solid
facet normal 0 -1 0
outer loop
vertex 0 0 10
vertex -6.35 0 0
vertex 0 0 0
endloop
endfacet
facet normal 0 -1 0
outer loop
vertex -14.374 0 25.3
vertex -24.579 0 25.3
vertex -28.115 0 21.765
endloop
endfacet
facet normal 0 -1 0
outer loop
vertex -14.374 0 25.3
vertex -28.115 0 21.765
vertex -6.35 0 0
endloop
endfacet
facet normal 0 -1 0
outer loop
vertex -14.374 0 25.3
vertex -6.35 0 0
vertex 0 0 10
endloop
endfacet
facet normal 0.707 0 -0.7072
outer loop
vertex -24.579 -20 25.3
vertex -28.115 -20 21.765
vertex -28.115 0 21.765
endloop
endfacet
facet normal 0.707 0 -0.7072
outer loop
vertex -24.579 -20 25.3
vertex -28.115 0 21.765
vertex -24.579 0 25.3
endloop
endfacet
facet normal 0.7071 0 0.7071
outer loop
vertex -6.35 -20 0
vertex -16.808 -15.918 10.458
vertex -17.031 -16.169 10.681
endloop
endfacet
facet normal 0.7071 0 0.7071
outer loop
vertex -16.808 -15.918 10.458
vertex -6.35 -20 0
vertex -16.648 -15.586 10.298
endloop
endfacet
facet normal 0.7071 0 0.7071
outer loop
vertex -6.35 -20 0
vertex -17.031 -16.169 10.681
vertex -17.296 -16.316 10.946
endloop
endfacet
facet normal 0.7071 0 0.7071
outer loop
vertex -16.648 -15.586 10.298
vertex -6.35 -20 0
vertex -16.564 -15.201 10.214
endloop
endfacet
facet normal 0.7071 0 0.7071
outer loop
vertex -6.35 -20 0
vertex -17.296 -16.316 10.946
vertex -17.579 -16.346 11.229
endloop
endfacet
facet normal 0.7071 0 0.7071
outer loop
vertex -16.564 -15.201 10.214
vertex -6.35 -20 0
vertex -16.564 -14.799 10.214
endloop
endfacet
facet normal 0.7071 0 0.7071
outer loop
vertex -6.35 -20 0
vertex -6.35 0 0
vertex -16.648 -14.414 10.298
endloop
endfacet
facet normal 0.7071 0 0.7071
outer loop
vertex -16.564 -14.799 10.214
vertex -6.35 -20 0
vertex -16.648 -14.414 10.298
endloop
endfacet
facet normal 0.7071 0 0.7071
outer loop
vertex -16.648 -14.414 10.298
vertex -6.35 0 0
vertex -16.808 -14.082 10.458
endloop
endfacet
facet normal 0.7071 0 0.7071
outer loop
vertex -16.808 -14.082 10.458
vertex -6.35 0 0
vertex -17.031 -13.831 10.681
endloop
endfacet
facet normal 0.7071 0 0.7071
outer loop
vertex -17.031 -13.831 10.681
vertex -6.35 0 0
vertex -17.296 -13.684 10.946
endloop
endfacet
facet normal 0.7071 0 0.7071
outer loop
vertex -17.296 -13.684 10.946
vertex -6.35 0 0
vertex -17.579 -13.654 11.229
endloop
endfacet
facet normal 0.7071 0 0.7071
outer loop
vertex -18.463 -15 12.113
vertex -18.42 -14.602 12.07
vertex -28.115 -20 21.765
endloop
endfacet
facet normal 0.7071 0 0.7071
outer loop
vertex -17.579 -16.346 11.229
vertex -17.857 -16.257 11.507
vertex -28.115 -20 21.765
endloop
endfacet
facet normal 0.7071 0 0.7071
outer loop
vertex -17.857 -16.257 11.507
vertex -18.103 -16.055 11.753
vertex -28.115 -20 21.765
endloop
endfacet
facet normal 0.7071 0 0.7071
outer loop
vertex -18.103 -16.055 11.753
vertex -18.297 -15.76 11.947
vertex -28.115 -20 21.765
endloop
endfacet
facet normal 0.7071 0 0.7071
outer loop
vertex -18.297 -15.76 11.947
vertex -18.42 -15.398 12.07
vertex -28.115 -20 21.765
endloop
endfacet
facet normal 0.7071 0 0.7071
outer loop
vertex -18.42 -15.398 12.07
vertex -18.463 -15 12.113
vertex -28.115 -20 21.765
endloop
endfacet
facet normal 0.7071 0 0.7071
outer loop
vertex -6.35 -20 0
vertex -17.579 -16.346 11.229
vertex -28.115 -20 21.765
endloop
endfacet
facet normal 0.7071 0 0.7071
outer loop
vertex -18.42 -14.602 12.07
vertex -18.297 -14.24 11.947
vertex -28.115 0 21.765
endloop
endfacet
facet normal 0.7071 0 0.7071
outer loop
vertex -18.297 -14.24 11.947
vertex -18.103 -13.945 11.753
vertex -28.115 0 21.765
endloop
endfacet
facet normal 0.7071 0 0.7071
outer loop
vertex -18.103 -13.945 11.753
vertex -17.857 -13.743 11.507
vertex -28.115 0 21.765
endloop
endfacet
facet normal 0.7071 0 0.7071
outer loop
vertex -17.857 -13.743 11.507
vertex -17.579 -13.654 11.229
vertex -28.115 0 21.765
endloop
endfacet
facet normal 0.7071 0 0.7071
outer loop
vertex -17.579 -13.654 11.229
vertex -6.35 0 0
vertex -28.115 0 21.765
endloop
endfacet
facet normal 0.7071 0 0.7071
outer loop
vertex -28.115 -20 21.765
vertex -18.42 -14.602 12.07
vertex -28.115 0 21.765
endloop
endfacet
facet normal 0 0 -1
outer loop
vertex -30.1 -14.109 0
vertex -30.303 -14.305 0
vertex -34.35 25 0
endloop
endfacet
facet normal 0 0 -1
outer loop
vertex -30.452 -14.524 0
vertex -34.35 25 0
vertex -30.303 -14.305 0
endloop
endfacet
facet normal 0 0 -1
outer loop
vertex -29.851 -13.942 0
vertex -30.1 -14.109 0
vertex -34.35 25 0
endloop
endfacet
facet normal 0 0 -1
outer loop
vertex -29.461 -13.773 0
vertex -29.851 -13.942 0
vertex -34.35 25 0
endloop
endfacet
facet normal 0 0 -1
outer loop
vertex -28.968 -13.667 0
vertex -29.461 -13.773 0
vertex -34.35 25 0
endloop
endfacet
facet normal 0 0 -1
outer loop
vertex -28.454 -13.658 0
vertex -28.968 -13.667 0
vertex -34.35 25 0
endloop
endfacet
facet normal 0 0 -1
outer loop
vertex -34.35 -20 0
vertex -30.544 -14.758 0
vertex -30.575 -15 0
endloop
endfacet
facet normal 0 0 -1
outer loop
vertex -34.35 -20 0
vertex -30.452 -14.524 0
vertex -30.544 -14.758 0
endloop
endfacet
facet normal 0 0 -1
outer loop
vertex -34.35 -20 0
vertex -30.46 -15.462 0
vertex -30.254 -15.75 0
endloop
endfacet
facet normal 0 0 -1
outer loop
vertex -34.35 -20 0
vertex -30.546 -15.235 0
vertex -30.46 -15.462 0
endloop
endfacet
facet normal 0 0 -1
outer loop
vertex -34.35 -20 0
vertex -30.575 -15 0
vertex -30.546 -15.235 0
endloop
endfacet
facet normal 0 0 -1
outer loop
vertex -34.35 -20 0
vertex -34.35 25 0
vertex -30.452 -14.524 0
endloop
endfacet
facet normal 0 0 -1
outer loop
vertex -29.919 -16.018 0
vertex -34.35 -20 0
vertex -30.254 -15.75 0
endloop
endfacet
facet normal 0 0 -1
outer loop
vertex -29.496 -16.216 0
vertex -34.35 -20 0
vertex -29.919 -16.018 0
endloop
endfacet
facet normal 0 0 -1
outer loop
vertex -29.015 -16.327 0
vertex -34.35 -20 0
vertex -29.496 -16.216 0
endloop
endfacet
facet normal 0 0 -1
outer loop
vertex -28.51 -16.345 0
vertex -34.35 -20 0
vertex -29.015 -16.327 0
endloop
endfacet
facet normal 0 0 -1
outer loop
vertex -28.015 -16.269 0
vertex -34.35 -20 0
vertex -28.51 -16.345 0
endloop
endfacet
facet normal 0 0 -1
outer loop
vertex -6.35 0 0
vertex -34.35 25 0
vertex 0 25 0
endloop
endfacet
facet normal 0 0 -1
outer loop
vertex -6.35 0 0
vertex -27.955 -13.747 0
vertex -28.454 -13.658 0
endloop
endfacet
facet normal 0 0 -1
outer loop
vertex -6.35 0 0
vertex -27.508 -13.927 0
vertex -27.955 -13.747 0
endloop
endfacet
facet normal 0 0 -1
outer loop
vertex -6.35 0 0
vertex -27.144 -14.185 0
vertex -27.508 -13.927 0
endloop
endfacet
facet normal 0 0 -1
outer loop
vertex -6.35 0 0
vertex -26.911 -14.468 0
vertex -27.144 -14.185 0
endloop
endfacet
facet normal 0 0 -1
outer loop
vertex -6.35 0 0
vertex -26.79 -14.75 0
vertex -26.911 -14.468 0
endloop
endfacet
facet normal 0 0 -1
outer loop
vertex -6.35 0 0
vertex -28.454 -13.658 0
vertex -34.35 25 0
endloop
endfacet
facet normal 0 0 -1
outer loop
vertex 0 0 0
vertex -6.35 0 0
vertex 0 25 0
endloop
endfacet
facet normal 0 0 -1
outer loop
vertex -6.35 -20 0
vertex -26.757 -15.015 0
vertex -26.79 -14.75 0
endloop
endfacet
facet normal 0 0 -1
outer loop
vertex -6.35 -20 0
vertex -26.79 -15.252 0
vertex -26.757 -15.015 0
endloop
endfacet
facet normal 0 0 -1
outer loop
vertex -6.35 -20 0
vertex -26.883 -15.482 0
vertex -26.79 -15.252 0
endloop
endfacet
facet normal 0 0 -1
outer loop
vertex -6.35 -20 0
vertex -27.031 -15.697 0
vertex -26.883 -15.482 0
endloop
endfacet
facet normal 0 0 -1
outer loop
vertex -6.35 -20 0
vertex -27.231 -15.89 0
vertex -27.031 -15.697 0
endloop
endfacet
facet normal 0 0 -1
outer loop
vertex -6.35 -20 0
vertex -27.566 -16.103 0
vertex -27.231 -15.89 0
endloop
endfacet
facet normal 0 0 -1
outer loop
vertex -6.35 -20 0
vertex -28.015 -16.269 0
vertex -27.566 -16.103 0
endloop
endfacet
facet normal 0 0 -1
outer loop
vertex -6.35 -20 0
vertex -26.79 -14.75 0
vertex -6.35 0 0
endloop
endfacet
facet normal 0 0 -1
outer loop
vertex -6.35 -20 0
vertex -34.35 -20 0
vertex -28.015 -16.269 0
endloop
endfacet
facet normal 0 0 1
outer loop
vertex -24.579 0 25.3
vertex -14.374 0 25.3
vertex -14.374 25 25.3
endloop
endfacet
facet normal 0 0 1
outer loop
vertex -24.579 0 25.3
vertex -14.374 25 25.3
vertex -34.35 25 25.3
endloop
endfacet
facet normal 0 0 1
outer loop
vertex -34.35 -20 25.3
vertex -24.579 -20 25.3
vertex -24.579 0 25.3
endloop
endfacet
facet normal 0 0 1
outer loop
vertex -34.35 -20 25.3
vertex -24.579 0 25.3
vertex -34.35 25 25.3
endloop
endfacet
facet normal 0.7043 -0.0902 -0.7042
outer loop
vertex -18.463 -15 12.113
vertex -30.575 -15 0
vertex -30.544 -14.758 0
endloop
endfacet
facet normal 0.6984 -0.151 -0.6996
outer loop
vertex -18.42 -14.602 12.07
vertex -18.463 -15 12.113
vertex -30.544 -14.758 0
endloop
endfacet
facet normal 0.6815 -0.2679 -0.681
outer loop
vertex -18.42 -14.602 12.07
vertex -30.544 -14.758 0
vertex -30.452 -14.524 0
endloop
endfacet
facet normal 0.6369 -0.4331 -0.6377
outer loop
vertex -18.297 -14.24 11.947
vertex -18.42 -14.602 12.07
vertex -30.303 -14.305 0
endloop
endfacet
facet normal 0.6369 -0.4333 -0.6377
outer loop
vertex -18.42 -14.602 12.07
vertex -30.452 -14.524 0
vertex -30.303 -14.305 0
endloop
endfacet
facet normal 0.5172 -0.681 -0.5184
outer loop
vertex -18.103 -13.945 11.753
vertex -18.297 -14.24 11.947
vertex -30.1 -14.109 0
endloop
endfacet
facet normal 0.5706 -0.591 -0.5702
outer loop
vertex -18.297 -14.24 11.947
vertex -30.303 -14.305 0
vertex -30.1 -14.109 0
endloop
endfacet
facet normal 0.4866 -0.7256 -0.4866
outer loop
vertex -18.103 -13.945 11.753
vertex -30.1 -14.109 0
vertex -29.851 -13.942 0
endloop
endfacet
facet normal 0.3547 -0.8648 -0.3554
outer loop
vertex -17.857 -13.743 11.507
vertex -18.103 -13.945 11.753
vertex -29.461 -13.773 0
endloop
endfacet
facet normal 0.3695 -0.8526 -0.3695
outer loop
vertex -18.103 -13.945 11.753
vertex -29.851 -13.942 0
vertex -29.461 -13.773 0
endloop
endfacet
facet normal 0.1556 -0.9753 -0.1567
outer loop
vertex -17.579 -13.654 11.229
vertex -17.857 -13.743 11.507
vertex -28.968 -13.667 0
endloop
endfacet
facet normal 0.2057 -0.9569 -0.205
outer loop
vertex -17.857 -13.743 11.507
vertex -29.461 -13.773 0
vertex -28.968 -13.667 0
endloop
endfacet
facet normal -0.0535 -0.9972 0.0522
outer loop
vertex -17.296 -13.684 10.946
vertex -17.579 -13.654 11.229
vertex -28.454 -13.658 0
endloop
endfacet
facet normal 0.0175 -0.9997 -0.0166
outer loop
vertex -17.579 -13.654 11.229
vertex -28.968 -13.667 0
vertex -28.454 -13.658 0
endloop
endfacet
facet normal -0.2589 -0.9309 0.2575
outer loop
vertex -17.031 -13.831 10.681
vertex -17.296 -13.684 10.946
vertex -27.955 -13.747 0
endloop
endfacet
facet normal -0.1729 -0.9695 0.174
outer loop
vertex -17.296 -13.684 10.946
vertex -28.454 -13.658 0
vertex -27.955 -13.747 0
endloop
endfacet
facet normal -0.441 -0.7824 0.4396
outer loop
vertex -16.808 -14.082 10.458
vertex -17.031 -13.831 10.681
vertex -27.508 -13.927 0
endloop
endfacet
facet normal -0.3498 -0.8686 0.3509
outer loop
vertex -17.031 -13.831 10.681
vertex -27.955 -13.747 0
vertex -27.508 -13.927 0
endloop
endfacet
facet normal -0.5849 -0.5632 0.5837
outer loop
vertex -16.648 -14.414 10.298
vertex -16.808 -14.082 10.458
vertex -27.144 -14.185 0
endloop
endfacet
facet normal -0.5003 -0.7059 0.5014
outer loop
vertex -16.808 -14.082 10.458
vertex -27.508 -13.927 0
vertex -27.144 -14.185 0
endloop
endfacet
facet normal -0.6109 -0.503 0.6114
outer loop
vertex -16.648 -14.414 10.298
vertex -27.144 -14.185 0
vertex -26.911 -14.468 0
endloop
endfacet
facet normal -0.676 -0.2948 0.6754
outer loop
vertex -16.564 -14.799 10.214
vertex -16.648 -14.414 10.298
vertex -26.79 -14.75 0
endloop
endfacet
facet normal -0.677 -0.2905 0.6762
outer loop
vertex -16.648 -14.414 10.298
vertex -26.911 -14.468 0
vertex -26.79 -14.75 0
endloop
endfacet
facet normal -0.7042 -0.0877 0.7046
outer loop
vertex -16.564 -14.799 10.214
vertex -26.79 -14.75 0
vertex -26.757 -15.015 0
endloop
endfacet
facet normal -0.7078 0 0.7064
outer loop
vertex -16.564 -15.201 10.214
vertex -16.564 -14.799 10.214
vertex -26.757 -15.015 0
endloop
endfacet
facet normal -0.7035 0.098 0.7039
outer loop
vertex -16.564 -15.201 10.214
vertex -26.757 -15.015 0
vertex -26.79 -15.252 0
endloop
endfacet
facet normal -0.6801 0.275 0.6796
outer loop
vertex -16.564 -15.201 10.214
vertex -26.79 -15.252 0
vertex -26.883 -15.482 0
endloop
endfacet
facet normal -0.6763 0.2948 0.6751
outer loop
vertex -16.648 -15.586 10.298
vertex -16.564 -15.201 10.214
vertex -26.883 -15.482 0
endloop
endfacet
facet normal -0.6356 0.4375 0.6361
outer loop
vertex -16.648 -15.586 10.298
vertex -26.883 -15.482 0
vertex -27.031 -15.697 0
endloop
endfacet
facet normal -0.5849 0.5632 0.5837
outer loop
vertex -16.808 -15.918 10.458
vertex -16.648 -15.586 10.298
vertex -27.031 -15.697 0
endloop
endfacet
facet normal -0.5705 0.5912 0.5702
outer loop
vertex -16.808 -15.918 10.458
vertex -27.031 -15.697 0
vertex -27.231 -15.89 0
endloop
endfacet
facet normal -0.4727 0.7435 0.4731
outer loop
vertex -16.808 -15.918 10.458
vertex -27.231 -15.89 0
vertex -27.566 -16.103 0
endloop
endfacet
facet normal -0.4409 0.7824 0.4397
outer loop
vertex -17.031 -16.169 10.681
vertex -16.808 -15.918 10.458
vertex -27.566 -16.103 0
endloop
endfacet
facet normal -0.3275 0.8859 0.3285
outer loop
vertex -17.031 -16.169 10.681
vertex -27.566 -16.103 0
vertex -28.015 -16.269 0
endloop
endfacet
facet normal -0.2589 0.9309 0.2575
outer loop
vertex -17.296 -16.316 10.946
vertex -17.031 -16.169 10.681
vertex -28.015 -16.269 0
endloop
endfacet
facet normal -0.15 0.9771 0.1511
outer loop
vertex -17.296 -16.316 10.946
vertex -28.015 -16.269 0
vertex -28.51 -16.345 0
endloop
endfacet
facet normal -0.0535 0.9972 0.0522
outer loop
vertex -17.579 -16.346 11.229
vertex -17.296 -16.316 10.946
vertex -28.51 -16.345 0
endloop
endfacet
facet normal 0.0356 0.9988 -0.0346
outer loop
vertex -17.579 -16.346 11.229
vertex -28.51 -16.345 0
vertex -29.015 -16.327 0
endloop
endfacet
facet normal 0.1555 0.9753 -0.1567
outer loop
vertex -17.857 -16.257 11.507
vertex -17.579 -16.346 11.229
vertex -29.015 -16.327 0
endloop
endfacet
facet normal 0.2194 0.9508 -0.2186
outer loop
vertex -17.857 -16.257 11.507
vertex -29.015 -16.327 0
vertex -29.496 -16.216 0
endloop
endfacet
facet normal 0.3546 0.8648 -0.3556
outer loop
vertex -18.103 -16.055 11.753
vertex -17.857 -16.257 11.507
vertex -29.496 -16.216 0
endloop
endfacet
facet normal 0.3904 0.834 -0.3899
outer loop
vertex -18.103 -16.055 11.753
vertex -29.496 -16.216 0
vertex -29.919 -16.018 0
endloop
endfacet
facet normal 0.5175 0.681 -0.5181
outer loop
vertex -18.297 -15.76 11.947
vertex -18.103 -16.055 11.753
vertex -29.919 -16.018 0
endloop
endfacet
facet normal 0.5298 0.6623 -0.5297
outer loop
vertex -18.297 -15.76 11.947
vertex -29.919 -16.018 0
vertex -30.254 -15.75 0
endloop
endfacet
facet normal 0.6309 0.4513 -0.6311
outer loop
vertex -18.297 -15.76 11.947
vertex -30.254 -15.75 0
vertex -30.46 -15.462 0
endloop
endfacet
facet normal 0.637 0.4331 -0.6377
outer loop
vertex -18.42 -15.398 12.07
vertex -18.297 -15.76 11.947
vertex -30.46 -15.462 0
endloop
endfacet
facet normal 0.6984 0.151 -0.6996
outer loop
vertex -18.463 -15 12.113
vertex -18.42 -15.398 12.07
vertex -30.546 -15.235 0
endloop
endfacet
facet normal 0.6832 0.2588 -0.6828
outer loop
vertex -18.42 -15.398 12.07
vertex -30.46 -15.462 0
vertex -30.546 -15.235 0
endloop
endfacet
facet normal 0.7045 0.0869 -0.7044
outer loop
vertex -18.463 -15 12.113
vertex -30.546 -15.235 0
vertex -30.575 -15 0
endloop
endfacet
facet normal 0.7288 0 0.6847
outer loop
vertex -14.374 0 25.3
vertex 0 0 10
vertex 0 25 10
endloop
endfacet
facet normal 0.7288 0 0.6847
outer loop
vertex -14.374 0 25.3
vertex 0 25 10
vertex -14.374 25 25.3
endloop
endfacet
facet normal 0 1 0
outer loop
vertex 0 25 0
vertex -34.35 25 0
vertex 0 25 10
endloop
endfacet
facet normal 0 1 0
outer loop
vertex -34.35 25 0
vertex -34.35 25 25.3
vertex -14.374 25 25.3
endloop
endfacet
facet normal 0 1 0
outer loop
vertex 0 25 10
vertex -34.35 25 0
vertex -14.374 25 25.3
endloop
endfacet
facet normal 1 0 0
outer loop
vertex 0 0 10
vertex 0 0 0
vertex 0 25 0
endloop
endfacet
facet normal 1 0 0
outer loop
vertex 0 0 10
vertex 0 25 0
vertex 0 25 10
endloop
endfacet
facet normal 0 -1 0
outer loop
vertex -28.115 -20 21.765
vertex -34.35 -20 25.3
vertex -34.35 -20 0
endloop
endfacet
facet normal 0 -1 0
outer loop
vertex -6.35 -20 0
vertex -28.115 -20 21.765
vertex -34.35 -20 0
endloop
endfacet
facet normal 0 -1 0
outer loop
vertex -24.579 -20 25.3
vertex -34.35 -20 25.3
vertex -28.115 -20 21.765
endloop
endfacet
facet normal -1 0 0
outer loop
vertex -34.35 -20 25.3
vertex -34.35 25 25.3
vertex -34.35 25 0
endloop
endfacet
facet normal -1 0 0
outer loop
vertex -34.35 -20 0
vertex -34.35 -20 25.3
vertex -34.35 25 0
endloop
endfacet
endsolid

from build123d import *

# Parameters (mm, degrees)
F1_DEPTH = 20
F3_DEPTH = 25
F5_D     = 2.7


with BuildPart() as f1:
    # F0 (on Front) → F1 (new body)
    with BuildSketch(Plane.XZ):
        Polygon((-34.35, 0), (-6.35, 0), (-28.11456562, 21.76456562), (-24.579031714, 25.3000995259), (-34.35, 25.3000995259), align=None)
    extrude(amount=F1_DEPTH)

    # F2 (on face) → F3 (join)
    with BuildSketch(Plane.XZ):
        Polygon((-34.35, 25.3000995259), (-34.35, 0), (0, 0), (0, 10), (-14.3736449024, 25.3000995259), (-24.579031714, 25.3000995259), align=None)
    extrude(amount=-F3_DEPTH)

    # F5 (through all)
    with Locations(Plane(origin=(-3.175, 0, -3.175), x_dir=(0.7071067812, 0, -0.7071067812), z_dir=(0.7071067812, 0, 0.7071067812))):
        with Locations((-20.2698719395, -15)):
            Hole(F5_D / 2)


solid = f1.part
